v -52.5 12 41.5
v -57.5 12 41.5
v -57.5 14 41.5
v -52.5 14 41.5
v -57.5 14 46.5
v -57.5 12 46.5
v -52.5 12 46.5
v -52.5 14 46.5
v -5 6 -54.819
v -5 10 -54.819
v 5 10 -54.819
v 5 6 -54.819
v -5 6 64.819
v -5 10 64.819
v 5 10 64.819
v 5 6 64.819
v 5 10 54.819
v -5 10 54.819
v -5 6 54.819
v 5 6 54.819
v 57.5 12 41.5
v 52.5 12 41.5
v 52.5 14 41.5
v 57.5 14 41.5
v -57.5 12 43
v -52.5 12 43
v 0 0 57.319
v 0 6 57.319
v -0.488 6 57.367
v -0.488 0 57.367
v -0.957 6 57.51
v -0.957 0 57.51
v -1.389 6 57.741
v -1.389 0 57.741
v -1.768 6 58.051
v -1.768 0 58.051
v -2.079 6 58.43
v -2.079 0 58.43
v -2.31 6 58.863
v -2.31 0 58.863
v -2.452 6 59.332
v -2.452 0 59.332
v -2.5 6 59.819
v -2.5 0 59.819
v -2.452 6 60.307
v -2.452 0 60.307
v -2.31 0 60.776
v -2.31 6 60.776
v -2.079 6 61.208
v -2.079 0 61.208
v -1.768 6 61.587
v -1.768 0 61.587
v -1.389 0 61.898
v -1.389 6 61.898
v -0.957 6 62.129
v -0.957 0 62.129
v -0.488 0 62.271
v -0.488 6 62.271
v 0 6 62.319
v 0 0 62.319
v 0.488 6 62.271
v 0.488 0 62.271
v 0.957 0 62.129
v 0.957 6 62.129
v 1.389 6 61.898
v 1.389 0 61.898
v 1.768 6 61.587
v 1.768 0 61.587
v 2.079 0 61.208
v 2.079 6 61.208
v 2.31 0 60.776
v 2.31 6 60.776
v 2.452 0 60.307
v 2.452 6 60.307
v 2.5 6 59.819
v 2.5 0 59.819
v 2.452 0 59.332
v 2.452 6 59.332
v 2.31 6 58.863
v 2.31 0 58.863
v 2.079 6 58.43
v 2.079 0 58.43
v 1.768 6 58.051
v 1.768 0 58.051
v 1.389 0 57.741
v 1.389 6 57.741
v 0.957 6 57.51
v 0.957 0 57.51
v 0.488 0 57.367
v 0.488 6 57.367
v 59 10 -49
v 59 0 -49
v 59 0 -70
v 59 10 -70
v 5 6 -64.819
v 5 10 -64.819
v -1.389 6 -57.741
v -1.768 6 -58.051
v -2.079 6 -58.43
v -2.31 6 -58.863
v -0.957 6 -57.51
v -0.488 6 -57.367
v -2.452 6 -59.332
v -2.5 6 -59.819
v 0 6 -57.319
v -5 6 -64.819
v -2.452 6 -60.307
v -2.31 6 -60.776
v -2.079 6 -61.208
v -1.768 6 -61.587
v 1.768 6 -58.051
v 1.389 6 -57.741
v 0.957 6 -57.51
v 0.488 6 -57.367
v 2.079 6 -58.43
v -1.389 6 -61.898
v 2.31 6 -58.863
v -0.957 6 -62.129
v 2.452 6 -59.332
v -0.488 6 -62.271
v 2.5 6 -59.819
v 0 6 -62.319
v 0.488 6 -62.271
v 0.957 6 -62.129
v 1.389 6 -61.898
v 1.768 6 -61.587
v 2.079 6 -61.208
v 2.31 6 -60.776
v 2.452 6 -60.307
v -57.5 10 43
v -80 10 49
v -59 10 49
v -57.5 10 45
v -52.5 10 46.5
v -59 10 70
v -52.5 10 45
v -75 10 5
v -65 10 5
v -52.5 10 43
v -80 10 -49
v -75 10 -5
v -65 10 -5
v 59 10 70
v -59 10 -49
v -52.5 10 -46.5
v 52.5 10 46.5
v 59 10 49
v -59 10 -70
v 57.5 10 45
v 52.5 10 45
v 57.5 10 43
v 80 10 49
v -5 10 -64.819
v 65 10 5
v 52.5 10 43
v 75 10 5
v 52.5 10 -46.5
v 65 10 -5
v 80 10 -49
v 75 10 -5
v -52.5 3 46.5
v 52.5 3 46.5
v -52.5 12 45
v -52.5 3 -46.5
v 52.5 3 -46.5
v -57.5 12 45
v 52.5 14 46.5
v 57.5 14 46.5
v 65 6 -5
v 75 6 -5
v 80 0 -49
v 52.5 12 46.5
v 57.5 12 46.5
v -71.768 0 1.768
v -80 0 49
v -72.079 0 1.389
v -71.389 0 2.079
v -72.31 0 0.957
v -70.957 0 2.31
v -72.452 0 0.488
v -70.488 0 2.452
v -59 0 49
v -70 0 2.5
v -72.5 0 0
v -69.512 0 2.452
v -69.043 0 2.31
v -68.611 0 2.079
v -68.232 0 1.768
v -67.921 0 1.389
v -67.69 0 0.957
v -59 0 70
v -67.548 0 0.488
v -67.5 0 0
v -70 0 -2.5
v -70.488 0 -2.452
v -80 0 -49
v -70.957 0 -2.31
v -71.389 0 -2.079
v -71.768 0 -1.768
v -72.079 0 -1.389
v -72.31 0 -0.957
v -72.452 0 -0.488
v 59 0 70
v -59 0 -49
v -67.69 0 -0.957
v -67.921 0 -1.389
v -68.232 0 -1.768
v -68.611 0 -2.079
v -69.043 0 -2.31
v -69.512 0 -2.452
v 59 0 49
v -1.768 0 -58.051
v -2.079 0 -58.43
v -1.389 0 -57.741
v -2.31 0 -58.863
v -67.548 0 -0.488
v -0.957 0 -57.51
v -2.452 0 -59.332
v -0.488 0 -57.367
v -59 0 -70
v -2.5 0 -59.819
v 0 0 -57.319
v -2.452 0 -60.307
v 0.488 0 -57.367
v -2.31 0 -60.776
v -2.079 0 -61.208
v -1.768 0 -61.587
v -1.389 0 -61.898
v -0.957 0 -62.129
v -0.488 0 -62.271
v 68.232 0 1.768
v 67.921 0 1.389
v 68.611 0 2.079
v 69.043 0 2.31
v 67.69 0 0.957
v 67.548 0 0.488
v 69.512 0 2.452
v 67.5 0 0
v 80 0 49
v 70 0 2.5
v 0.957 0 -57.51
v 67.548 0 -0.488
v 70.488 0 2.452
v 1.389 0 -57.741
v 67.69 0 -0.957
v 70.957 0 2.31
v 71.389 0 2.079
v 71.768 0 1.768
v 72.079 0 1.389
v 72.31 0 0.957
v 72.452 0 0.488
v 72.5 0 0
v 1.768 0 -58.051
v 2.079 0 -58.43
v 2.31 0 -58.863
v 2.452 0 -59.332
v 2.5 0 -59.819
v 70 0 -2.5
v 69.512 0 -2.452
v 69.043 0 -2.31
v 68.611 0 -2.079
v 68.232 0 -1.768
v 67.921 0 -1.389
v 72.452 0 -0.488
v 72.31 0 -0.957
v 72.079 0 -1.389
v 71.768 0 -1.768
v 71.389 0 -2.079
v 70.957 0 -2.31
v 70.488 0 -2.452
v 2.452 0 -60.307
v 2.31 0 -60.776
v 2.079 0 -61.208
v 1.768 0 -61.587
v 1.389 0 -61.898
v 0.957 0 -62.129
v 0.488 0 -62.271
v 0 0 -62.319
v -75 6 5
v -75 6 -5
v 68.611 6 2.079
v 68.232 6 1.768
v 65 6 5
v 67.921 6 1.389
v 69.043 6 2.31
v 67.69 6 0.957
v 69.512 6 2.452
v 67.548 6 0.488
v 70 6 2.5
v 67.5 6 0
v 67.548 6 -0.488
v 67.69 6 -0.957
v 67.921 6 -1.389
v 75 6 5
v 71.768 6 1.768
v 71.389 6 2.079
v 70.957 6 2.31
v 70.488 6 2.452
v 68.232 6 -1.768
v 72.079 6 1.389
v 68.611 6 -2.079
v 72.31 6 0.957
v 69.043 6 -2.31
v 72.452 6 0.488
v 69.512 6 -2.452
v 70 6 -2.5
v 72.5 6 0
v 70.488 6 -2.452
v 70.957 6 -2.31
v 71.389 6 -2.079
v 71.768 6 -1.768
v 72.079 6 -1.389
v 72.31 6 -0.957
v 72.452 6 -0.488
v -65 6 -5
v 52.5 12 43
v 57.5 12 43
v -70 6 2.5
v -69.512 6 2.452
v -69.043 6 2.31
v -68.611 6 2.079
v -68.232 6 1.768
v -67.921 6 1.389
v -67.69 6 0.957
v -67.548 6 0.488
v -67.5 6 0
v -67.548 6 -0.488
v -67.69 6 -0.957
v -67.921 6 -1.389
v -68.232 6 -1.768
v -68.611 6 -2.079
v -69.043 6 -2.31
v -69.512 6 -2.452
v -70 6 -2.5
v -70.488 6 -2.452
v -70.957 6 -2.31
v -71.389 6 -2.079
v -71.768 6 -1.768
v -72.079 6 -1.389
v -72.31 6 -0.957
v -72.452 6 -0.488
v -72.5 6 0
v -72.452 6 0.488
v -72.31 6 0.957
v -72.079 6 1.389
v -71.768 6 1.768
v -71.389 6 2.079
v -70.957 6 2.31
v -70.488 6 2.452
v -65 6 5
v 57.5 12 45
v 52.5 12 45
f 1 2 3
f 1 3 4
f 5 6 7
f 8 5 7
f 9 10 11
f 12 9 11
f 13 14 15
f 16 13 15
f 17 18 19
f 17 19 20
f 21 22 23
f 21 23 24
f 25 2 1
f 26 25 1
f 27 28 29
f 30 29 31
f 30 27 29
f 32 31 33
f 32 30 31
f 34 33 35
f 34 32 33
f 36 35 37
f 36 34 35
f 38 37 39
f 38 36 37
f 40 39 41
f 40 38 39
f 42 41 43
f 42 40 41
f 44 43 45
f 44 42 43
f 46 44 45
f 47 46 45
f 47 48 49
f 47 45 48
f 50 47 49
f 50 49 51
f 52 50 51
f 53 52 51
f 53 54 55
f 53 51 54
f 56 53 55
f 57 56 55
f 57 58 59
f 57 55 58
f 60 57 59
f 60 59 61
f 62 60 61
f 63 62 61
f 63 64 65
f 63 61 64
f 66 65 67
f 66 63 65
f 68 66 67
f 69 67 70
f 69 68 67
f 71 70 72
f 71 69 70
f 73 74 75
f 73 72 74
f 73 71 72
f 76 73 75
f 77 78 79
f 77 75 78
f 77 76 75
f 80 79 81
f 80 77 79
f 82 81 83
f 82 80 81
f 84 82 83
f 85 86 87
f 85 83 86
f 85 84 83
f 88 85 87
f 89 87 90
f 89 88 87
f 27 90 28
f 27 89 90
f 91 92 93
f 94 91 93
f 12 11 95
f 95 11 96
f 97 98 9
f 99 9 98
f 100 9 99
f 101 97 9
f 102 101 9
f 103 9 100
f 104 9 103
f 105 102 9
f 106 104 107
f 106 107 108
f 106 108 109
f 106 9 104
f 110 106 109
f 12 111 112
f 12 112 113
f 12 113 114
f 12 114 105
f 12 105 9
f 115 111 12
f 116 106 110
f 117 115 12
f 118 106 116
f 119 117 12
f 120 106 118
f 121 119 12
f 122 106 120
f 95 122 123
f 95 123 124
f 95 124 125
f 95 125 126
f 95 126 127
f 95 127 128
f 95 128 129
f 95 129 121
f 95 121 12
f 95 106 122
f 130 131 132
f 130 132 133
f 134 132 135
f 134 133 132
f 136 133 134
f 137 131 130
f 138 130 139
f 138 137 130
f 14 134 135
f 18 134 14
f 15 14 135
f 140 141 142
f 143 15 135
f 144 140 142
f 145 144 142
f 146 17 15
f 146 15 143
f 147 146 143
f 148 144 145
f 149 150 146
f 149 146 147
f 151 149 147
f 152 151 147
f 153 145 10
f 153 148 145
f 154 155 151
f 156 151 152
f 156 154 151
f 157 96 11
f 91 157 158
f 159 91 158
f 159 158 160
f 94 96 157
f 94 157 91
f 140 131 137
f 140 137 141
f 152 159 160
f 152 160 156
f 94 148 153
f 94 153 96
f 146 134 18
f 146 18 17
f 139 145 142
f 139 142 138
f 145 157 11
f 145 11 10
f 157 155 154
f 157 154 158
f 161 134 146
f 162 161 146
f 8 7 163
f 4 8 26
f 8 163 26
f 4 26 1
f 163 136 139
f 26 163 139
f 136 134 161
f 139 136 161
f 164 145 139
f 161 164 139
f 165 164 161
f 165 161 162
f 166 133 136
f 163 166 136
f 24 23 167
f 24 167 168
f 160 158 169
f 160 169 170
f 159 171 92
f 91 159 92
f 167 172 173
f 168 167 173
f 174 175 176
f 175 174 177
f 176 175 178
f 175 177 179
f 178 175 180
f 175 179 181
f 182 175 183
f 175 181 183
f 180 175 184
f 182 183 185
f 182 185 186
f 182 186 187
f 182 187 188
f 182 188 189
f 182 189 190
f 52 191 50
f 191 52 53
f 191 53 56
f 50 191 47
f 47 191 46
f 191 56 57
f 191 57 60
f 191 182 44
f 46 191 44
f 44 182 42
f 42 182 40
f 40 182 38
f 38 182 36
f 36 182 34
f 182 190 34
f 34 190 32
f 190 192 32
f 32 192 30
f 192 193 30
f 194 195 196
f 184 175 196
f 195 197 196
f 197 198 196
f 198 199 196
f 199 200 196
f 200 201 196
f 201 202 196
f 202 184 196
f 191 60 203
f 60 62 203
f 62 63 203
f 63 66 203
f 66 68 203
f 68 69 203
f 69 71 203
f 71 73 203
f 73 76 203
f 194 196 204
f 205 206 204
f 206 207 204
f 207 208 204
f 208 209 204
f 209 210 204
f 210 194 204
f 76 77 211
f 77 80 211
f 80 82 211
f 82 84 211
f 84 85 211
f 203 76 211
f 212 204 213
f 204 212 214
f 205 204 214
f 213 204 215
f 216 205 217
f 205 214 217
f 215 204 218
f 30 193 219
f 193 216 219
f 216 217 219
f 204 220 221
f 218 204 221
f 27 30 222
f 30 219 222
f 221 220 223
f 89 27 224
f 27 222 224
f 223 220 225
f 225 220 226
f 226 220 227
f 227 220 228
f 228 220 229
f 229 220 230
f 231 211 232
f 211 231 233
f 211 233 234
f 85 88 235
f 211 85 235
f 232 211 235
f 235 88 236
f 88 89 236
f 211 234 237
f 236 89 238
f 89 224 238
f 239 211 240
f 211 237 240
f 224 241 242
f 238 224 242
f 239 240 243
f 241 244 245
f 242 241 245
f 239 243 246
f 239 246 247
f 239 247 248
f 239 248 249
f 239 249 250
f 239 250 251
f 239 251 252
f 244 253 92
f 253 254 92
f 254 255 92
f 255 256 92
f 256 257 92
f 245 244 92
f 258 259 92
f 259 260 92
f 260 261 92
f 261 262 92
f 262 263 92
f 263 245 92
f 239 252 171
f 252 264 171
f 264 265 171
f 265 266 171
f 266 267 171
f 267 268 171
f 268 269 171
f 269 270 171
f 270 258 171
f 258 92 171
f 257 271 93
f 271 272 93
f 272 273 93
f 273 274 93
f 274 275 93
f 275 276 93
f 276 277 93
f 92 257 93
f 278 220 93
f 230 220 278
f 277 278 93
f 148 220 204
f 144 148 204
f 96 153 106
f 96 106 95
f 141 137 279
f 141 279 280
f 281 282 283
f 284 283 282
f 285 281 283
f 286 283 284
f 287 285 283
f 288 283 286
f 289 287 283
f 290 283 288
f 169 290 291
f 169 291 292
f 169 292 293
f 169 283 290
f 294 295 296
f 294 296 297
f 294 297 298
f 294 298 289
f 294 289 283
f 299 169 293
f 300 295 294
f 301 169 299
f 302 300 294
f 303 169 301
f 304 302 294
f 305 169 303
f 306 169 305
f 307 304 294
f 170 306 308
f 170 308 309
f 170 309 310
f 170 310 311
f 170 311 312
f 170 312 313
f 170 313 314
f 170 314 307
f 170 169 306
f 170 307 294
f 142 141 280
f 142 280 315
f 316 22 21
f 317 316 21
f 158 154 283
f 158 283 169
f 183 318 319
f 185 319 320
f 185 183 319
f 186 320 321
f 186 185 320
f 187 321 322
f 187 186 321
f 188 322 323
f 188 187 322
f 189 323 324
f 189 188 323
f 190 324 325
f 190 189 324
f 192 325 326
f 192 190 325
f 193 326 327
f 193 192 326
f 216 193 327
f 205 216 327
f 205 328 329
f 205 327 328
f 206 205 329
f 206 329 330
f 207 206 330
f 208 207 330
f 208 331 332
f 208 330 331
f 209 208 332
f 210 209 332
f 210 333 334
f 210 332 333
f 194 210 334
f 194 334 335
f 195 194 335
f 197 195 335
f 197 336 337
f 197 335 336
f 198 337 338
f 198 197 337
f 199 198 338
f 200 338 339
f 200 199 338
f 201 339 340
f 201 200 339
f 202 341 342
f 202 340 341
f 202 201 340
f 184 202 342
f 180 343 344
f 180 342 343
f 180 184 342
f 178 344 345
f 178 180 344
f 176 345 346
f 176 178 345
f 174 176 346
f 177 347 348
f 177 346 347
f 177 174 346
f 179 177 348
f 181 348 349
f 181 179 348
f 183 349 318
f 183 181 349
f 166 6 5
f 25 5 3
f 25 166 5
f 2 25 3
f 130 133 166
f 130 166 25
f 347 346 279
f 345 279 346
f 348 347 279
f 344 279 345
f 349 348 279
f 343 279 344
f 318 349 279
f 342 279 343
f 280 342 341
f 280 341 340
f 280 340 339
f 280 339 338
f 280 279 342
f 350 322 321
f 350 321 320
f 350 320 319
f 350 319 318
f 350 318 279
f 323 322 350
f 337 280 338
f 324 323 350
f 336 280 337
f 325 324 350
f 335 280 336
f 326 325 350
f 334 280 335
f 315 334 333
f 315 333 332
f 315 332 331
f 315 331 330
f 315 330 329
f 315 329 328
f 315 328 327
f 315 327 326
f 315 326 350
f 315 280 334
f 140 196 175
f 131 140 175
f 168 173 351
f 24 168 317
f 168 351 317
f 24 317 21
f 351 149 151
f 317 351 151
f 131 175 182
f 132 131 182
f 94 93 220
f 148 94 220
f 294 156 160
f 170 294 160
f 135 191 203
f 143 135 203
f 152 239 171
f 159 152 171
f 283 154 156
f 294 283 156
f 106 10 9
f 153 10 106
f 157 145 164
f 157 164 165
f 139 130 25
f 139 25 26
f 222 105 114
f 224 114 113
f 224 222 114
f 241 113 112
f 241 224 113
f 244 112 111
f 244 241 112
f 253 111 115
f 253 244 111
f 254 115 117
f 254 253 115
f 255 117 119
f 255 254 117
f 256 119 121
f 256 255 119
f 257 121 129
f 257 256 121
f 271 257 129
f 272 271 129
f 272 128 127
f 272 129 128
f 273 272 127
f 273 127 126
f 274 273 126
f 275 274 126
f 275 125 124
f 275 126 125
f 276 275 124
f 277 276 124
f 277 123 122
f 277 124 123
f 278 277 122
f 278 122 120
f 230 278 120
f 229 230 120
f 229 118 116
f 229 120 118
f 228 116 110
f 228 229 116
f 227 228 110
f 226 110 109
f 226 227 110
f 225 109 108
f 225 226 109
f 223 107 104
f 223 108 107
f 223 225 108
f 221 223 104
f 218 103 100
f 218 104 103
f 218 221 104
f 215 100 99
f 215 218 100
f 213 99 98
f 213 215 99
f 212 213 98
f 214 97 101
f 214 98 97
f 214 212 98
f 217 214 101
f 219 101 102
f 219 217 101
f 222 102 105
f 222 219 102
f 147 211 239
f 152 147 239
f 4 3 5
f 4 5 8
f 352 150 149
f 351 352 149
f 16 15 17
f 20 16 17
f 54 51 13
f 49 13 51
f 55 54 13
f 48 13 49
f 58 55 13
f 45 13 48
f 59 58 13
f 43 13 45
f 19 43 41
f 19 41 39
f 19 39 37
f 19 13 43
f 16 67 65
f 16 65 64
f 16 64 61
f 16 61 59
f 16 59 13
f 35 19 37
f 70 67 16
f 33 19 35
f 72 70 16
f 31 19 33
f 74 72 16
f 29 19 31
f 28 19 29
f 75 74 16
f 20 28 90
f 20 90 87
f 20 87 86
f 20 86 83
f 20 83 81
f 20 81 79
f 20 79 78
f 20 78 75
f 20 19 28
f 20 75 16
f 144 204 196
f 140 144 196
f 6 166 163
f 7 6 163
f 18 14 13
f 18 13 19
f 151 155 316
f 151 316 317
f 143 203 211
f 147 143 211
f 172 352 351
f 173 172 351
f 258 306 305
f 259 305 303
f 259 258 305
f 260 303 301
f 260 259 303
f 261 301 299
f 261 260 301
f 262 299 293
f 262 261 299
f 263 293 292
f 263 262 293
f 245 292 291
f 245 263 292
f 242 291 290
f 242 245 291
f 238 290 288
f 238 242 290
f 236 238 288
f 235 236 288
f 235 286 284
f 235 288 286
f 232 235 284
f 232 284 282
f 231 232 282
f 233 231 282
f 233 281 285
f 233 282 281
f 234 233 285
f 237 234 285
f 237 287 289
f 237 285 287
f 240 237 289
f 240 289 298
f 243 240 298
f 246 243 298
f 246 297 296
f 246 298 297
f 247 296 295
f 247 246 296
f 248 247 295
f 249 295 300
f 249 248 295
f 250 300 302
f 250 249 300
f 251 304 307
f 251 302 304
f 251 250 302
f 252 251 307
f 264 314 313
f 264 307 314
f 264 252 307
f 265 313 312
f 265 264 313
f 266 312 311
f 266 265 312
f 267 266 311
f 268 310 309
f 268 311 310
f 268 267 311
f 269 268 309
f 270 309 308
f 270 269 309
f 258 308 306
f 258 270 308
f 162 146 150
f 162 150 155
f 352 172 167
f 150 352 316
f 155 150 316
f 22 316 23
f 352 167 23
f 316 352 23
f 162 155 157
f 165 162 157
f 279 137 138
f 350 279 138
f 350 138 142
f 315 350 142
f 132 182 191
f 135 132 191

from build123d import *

# Parameters (mm, degrees)
SKETCH2_R           = 2.5
BOSS_EXTRUDE1_DEPTH = 10
SKETCH9_W           = 10
SKETCH9_H           = 10
CUT_EXTRUDE1_DEPTH  = 4
SKETCH11_W          = 105
SKETCH11_H          = 93
CUT_EXTRUDE2_DEPTH  = 7
SKETCH12_W          = 5
SKETCH12_H          = 2
BOSS_EXTRUDE2_DEPTH = 2
SKETCH13_W          = 5
SKETCH13_H          = 5
BOSS_EXTRUDE3_DEPTH = 2


with BuildPart() as part:
    # Sketch2 → Boss-Extrude1 (new body)
    with BuildSketch(Plane(origin=(0, 0, 0), x_dir=(1, 0, 0), z_dir=(0, 1, 0))):
        Polygon((-59, 70), (-59, 49), (-80, 49), (-80, -49), (-59, -49), (-59, -70), (59, -70), (59, -49), (80, -49), (80, 49), (59, 49), (59, 70), align=None)
        with Locations(Location((0, 59.819243353, 0), (0, 0, 270))):
            Circle(SKETCH2_R, mode=Mode.SUBTRACT)
        with Locations(Location((0, -59.819243353, 0), (0, 0, 90))):
            Circle(SKETCH2_R, mode=Mode.SUBTRACT)
        with Locations(Location((-70, 0, 0), (0, 0, 270))):
            Circle(SKETCH2_R, mode=Mode.SUBTRACT)
        with Locations(Location((70, 0, 0), (0, 0, 90))):
            Circle(SKETCH2_R, mode=Mode.SUBTRACT)
    extrude(amount=BOSS_EXTRUDE1_DEPTH)

    # Sketch9 → Cut-Extrude1 (cut)
    with BuildSketch(Plane(origin=(0, 10, 0), x_dir=(1, 0, 0), z_dir=(0, 1, 0))):
        with Locations((0, 59.819243353)):
            Rectangle(SKETCH9_W, SKETCH9_H)
        with Locations((-70, 0)):
            Rectangle(SKETCH9_W, SKETCH9_H)
        with Locations((70, 0)):
            Rectangle(SKETCH9_W, SKETCH9_H)
        with Locations((0, -59.819243353)):
            Rectangle(SKETCH9_W, SKETCH9_H)
    extrude(amount=-CUT_EXTRUDE1_DEPTH, mode=Mode.SUBTRACT)

    # Sketch11 → Cut-Extrude2 (cut)
    with BuildSketch(Plane(origin=(0, 10, 0), x_dir=(1, 0, 0), z_dir=(0, 1, 0))):
        Rectangle(SKETCH11_W, SKETCH11_H)
    extrude(amount=-CUT_EXTRUDE2_DEPTH, mode=Mode.SUBTRACT)

    # Sketch12 → Boss-Extrude2 (add)
    with BuildSketch(Plane(origin=(0, 10, 0), x_dir=(1, 0, 0), z_dir=(0, 1, 0))):
        with Locations((-55, -44)):
            Rectangle(SKETCH12_W, SKETCH12_H)
        with Locations((55, -44)):
            Rectangle(SKETCH12_W, SKETCH12_H)
    extrude(amount=BOSS_EXTRUDE2_DEPTH)

    # Sketch13 → Boss-Extrude3 (add)
    with BuildSketch(Plane(origin=(0, 12, 0), x_dir=(1, 0, 0), z_dir=(0, 1, 0))):
        with Locations((-55, -44)):
            Rectangle(SKETCH13_W, SKETCH13_H)
        with Locations((55, -44)):
            Rectangle(SKETCH13_W, SKETCH13_H)
    extrude(amount=BOSS_EXTRUDE3_DEPTH)


solid = part.part
